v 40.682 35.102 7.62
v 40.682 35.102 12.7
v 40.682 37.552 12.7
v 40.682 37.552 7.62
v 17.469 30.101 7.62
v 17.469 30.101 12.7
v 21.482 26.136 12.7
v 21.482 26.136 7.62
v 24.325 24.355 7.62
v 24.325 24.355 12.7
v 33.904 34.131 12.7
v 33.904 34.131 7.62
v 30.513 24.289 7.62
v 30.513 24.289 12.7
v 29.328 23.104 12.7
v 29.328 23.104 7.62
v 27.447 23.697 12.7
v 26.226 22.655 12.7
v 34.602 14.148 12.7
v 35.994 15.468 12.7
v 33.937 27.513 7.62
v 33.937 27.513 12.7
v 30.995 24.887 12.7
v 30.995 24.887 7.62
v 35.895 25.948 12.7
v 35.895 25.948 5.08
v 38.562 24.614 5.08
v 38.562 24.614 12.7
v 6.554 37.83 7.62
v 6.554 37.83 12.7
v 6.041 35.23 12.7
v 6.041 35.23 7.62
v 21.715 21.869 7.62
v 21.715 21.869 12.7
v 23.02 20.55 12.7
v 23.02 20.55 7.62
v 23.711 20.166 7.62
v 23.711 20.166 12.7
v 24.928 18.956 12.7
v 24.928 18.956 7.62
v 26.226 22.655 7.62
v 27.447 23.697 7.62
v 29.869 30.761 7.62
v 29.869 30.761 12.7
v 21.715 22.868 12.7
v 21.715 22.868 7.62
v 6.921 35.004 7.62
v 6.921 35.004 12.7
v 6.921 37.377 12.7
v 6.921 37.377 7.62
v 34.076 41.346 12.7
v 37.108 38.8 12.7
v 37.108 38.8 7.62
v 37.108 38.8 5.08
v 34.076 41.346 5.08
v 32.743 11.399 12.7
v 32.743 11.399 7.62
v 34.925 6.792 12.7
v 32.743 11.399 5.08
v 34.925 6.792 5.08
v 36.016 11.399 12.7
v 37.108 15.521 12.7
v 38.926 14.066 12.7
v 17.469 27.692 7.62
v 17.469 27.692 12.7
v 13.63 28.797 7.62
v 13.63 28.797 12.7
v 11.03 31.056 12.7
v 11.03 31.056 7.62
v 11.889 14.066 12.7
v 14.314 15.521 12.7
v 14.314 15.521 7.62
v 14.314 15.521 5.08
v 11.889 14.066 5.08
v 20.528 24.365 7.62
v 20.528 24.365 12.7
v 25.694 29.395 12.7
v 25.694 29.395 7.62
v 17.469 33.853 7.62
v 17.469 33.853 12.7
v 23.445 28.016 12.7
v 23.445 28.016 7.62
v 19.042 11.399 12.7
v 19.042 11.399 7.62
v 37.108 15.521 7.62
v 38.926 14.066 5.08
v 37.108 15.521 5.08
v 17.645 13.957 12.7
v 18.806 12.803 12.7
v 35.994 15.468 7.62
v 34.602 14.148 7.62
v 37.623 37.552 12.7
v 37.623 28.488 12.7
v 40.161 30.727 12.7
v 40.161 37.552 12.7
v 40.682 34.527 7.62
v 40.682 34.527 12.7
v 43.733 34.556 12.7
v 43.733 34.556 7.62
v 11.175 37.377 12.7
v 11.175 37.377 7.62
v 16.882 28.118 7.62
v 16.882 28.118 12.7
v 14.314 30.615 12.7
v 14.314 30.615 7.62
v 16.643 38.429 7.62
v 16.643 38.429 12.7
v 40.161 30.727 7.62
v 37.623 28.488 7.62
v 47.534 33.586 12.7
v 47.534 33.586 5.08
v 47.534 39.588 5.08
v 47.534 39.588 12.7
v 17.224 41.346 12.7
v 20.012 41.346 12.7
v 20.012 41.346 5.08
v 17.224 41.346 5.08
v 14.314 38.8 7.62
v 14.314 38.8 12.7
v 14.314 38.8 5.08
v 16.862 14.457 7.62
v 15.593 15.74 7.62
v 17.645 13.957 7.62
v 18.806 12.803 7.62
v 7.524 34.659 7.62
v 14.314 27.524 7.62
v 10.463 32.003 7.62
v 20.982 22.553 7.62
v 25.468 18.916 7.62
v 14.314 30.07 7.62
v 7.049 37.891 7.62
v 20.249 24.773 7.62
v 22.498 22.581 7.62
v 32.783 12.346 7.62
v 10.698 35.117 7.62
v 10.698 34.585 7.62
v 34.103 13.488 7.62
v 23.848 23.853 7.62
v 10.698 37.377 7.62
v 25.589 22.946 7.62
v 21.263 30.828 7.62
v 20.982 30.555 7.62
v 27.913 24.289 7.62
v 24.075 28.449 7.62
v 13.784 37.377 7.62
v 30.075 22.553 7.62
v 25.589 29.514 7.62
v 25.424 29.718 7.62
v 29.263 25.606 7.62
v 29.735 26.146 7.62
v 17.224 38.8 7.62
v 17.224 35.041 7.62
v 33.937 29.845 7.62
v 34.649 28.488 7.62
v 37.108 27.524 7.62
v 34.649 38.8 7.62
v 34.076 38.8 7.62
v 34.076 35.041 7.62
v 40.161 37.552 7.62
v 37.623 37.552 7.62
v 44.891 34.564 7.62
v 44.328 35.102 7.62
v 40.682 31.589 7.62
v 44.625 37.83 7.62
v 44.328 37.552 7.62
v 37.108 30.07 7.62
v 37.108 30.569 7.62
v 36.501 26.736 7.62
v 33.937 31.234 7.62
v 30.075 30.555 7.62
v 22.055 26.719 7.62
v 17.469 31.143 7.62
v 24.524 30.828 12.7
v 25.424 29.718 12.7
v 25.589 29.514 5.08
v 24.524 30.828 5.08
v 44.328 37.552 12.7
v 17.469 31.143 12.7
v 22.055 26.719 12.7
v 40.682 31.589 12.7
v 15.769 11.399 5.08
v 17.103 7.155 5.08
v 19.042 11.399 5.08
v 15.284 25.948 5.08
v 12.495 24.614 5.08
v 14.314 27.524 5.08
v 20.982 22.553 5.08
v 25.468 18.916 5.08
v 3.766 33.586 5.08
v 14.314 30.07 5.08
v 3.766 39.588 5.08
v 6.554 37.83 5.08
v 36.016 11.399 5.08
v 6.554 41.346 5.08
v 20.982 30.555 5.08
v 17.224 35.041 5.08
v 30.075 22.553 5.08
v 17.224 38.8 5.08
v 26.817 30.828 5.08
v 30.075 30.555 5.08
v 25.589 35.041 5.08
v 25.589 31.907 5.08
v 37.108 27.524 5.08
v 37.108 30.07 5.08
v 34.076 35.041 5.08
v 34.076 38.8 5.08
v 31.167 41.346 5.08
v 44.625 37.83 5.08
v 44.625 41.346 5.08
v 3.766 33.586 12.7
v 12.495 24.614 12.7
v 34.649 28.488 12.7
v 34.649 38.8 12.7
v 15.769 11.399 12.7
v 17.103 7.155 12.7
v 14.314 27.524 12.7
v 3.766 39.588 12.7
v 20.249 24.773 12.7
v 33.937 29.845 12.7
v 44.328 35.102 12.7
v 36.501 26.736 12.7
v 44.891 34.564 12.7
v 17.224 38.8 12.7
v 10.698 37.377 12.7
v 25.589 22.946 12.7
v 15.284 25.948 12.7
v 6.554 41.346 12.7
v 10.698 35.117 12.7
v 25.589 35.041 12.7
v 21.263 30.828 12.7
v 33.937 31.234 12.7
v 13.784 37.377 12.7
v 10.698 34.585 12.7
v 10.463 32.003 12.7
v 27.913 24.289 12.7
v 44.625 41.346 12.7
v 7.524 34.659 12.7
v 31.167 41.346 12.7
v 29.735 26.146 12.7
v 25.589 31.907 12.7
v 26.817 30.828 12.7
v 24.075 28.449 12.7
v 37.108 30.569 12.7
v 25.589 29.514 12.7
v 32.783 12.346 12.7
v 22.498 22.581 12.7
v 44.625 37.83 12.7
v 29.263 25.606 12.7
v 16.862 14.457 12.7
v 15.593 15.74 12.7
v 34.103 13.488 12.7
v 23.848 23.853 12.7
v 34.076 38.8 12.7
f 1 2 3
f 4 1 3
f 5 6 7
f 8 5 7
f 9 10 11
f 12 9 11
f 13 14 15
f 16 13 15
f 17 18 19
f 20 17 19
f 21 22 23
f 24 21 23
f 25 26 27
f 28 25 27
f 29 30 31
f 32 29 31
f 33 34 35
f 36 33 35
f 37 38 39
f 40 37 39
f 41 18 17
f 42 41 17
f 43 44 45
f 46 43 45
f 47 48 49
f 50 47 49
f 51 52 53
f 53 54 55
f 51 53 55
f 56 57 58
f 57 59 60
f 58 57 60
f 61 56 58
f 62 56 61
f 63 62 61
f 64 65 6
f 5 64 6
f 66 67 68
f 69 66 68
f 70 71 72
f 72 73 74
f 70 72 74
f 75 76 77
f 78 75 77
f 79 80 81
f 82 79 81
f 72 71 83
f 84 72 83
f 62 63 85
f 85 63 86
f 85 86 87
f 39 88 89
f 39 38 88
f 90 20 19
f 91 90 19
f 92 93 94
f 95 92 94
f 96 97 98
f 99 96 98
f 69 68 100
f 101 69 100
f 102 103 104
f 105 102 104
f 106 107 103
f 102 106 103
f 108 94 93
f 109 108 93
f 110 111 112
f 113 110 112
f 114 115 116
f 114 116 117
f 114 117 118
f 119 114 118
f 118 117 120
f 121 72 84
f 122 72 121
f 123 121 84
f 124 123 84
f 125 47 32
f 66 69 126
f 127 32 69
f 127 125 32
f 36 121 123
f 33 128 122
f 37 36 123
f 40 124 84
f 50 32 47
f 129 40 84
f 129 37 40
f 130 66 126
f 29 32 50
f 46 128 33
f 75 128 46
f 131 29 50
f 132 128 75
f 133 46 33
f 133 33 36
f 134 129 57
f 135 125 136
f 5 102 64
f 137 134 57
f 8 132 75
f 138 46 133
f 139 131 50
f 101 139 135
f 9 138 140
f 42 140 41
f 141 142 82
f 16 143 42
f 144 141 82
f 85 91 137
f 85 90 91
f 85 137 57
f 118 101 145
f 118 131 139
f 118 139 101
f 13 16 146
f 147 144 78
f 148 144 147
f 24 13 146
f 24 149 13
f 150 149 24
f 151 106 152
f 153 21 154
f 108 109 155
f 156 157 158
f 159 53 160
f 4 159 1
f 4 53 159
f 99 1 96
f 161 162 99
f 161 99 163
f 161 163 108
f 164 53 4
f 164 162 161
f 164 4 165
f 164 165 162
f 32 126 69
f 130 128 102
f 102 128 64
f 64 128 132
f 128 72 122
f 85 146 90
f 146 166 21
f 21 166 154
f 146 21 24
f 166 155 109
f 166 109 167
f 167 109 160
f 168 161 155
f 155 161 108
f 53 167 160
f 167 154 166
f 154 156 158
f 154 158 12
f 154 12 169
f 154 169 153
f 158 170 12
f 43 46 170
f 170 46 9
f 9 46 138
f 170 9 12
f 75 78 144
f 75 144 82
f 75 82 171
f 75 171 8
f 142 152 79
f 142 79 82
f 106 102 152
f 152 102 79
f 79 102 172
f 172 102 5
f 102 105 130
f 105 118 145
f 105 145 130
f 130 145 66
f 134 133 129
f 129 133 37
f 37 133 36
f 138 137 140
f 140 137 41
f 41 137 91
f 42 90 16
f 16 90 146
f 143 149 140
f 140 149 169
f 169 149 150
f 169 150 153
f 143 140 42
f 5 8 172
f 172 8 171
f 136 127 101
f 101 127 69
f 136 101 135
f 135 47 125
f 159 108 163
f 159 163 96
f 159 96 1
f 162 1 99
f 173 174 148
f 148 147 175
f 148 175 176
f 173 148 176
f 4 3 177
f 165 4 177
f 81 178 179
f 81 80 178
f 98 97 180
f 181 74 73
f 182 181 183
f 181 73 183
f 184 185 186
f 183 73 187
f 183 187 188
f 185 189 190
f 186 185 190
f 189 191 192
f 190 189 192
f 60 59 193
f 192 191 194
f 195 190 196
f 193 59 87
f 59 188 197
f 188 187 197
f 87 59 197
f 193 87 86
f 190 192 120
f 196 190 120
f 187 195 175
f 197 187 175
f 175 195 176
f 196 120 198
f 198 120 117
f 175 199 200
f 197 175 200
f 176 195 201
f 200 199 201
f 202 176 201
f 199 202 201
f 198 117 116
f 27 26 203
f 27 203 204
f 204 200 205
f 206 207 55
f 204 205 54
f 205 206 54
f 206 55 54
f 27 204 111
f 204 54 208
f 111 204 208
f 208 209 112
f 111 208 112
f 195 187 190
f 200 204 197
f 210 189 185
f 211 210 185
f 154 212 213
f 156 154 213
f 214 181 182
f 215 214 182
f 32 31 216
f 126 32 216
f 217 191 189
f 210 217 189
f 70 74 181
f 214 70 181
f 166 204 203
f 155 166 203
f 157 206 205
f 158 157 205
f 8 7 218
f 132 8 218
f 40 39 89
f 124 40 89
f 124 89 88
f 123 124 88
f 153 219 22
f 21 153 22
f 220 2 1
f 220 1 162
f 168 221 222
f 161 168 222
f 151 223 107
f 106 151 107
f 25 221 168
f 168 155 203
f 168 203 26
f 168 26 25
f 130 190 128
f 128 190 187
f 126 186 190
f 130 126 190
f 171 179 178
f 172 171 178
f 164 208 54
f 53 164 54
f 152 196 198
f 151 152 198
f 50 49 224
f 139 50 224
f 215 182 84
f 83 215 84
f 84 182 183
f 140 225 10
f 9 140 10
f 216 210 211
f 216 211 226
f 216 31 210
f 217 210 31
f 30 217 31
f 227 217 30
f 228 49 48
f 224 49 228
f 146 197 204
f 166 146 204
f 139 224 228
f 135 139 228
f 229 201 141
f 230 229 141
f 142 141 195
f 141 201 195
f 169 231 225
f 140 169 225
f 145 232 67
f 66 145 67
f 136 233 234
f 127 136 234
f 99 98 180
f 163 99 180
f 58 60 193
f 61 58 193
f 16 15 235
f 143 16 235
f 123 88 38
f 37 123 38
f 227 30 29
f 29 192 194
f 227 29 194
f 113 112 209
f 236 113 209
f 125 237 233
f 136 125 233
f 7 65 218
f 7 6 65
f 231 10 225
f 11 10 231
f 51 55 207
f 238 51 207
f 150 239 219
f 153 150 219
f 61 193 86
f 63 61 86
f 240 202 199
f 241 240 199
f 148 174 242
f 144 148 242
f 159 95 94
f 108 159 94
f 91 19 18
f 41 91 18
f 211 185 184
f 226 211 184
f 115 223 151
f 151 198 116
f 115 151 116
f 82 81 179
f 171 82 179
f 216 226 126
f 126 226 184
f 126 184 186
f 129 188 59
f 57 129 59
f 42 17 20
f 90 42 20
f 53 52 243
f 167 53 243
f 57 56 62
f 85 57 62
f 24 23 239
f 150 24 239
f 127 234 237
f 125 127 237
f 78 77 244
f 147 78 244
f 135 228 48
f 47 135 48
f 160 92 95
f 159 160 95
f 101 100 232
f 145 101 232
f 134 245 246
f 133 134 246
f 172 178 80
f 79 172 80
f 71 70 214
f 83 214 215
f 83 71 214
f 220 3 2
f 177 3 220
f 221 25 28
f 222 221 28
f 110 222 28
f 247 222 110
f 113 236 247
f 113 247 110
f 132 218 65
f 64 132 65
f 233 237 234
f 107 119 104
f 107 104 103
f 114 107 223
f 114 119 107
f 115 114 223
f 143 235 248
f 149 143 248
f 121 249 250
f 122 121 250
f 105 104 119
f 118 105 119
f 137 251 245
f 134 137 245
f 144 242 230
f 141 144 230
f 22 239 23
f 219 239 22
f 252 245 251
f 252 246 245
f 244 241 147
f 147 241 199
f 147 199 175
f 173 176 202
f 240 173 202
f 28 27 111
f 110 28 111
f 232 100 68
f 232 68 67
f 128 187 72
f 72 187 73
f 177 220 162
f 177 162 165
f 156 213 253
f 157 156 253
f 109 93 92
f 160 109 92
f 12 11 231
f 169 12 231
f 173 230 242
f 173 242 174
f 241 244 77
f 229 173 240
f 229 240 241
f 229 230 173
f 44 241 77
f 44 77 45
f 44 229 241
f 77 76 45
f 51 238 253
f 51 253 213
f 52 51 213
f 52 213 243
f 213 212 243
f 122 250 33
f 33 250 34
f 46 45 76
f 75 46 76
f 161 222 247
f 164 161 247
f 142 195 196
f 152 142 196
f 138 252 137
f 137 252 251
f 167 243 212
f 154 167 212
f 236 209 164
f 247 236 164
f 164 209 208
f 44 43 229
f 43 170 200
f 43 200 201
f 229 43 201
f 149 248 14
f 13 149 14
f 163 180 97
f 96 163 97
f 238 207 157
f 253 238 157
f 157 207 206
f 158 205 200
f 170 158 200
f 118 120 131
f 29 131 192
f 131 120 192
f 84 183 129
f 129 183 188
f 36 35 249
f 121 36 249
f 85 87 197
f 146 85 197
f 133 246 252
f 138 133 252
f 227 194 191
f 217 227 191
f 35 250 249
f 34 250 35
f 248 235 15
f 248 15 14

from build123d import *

# Parameters (mm, degrees)
F1_DEPTH = 12.7
F2_W     = 3.6453269422
F2_H     = 2.4501346052
F3_DEPTH = 5.08
F4_DEPTH = 5.08


with BuildPart() as f1:
    # F0 (on Top) → F1 (new body)
    with BuildSketch(Plane.XY):
        Polygon((6.5544429235, 37.8296226263), (6.5544429235, 41.3456484675), (3.76586942, 39.5876355469), (3.76586942, 33.586140722), (12.4953174964, 24.6142074466), (15.2838900685, 25.9478744119), (14.313952066, 27.5240242481), (14.313952066, 30.0701130182), (20.9822803736, 22.5530881435), (14.313952066, 15.521033667), (11.8891056627, 14.0661261976), (15.7688595355, 11.3987950608), (17.1025265008, 7.1553131565), (19.0424025059, 11.3987950608), (25.4682451487, 18.9158190042), (32.7427871525, 11.3987950608), (34.925147891, 6.791586522), (36.0163263977, 11.3987950608), (38.9261469245, 14.0661261976), (37.1075086296, 15.521033667), (30.0754550844, 22.5530881435), (37.1075086296, 30.0701130182), (37.1075086296, 27.5240242481), (35.8950868249, 25.9478744119), (38.5624170303, 24.6142074466), (47.5343503058, 33.586140722), (47.5343503058, 39.5876355469), (44.6245335042, 41.3456484675), (44.6245335042, 37.8296226263), (37.1075086296, 38.7995615602), (34.0764522552, 41.3456484675), (31.1666354537, 41.3456484675), (34.0764522552, 38.7995615602), (34.0764522552, 35.0410491228), (30.0754550844, 30.5550824851), (25.5894884467, 35.0410491228), (20.9822803736, 30.5550824851), (17.2237679362, 35.0410491228), (17.2237679362, 38.7995615602), (20.0123414397, 41.3456484675), (17.2237679362, 41.3456484675), (14.313952066, 38.7995615602), align=None)
        Polygon((24.5242901146, 30.8284908533), (25.5894884467, 31.9072976708), (26.8167555332, 30.8284908533), (25.5894884467, 29.5136924833), align=None, mode=Mode.SUBTRACT)
    extrude(amount=F1_DEPTH)

    # F2 (on face) → F3 (cut)
    with BuildSketch(Plane.XY.offset(12.7)):
        Polygon((7.0490693162, 37.8914509439), (6.5544429235, 37.8296226263), (6.0410341248, 35.2296121418), (14.313952066, 27.5240242481), (14.313952066, 30.0701130182), (20.9822803736, 22.5530881435), (14.313952066, 15.521033667), (19.0424025059, 11.3987950608), (25.4682451487, 18.9158190042), (32.7427871525, 11.3987950608), (37.1075086296, 15.521033667), (30.0754550844, 22.5530881435), (37.1075086296, 30.0701130182), (37.1075086296, 27.5240242481), (36.5012977272, 26.73594933), (44.8912195861, 34.5637351274), (44.6245335042, 37.8296226263), (37.1075086296, 38.7995615602), (37.1075086296, 30.5685326457), (34.6490368247, 28.4877605736), (34.6490368247, 30.5685326457), (34.6490368247, 38.7995615602), (34.0764522552, 38.7995615602), (34.0764522552, 35.0410491228), (30.0754550844, 30.5550824851), (29.8693068326, 30.761230737), (21.7151734978, 22.8682607412), (20.5283816904, 24.3646502495), (25.694264099, 29.3949842453), (25.5894884467, 29.5136924833), (25.4240528691, 29.7178933549), (24.0751728415, 28.4491963685), (21.2630781019, 30.8284908533), (20.9822803736, 30.5550824851), (17.2237679362, 35.0410491228), (17.2237679362, 38.7995615602), (16.6432019323, 38.4291112423), (16.8820619583, 28.1179565936), (14.313952066, 30.6153800339), (14.313952066, 38.7995615602), align=None)
        Polygon((15.5932606215, 15.7401643943), (21.7151734978, 21.8692570925), (23.0203711557, 20.550046149), (16.8623554934, 14.4574438554), align=None, mode=Mode.SUBTRACT)
        Polygon((17.6451402405, 13.9573783364), (23.711329326, 20.1660916209), (24.9279786679, 18.9555015123), (18.8057093955, 12.8025891205), align=None, mode=Mode.SUBTRACT)
        Polygon((32.7832475305, 12.346426025), (22.4977247417, 22.5807242095), (23.8481555134, 23.8528680056), (34.1030471027, 13.4878745303), align=None, mode=Mode.SUBTRACT)
        Polygon((26.2261033058, 22.6549040526), (27.4469424039, 23.696700111), (35.9935723245, 15.4675748199), (34.6024334431, 14.1477743164), align=None, mode=Mode.SUBTRACT)
        Polygon((17.4691583961, 27.6918299496), (17.4691583961, 30.1007553935), (21.482238546, 26.135975495), (20.2486850321, 24.7733257711), align=None, mode=Mode.SUBTRACT)
        Polygon((17.4691583961, 31.1430785805), (17.4691583961, 33.8531173766), (23.445142433, 28.0161090195), (22.0553781837, 26.7189964652), align=None, mode=Mode.SUBTRACT)
        Polygon((7.5238011777, 34.6592962742), (10.6979301199, 34.5851331949), (10.4632368311, 32.0025421679), align=None, mode=Mode.SUBTRACT)
        Polygon((6.9207791239, 35.0040383637), (6.9207791239, 37.3774655163), (10.6979301199, 37.3774655163), (10.6979301199, 35.1172611117), align=None, mode=Mode.SUBTRACT)
        Polygon((13.6304246262, 28.7970686331), (11.0295182094, 31.0556814075), (11.1747216433, 37.3774655163), (13.784497045, 37.3774655163), align=None, mode=Mode.SUBTRACT)
        Polygon((27.9130805284, 24.2891721427), (29.262598604, 25.6057772785), (30.5133741349, 24.2891721427), (29.3284300715, 23.1042280793), align=None, mode=Mode.SUBTRACT)
        Polygon((30.9950727969, 24.886559695), (29.7354832292, 26.1461511254), (33.9365452528, 29.8445243388), (33.9365452528, 27.5129415095), align=None, mode=Mode.SUBTRACT)
        Polygon((24.3253335357, 24.3550017476), (33.9036285877, 34.1307893395), (33.9365452528, 31.2342606485), (25.5894884467, 22.9456070811), align=None, mode=Mode.SUBTRACT)
        Polygon((37.6231558621, 30.7271517813), (37.6231558621, 37.5519581139), (40.1610732079, 37.5519581139), (40.1610732079, 30.7271517813), (37.6231558621, 28.4877605736), align=None, mode=Mode.SUBTRACT)
        Polygon((40.6824201345, 34.5267690718), (43.7329895794, 34.5558524132), (40.6824201345, 31.5891802311), align=None, mode=Mode.SUBTRACT)
        with Locations((42.5050836056, 36.3268908113)):
            Rectangle(F2_W, F2_H, mode=Mode.SUBTRACT)
    extrude(amount=-F3_DEPTH, mode=Mode.SUBTRACT)

    # F4 (cut): a face of the model
    f4_faces = [f1.faces().sort_by_distance(p)[0] for p in [
        (25.6298789879, 27.4747864978, 0),
    ]]
    extrude(f4_faces, amount=-F4_DEPTH, mode=Mode.SUBTRACT)


solid = f1.part
